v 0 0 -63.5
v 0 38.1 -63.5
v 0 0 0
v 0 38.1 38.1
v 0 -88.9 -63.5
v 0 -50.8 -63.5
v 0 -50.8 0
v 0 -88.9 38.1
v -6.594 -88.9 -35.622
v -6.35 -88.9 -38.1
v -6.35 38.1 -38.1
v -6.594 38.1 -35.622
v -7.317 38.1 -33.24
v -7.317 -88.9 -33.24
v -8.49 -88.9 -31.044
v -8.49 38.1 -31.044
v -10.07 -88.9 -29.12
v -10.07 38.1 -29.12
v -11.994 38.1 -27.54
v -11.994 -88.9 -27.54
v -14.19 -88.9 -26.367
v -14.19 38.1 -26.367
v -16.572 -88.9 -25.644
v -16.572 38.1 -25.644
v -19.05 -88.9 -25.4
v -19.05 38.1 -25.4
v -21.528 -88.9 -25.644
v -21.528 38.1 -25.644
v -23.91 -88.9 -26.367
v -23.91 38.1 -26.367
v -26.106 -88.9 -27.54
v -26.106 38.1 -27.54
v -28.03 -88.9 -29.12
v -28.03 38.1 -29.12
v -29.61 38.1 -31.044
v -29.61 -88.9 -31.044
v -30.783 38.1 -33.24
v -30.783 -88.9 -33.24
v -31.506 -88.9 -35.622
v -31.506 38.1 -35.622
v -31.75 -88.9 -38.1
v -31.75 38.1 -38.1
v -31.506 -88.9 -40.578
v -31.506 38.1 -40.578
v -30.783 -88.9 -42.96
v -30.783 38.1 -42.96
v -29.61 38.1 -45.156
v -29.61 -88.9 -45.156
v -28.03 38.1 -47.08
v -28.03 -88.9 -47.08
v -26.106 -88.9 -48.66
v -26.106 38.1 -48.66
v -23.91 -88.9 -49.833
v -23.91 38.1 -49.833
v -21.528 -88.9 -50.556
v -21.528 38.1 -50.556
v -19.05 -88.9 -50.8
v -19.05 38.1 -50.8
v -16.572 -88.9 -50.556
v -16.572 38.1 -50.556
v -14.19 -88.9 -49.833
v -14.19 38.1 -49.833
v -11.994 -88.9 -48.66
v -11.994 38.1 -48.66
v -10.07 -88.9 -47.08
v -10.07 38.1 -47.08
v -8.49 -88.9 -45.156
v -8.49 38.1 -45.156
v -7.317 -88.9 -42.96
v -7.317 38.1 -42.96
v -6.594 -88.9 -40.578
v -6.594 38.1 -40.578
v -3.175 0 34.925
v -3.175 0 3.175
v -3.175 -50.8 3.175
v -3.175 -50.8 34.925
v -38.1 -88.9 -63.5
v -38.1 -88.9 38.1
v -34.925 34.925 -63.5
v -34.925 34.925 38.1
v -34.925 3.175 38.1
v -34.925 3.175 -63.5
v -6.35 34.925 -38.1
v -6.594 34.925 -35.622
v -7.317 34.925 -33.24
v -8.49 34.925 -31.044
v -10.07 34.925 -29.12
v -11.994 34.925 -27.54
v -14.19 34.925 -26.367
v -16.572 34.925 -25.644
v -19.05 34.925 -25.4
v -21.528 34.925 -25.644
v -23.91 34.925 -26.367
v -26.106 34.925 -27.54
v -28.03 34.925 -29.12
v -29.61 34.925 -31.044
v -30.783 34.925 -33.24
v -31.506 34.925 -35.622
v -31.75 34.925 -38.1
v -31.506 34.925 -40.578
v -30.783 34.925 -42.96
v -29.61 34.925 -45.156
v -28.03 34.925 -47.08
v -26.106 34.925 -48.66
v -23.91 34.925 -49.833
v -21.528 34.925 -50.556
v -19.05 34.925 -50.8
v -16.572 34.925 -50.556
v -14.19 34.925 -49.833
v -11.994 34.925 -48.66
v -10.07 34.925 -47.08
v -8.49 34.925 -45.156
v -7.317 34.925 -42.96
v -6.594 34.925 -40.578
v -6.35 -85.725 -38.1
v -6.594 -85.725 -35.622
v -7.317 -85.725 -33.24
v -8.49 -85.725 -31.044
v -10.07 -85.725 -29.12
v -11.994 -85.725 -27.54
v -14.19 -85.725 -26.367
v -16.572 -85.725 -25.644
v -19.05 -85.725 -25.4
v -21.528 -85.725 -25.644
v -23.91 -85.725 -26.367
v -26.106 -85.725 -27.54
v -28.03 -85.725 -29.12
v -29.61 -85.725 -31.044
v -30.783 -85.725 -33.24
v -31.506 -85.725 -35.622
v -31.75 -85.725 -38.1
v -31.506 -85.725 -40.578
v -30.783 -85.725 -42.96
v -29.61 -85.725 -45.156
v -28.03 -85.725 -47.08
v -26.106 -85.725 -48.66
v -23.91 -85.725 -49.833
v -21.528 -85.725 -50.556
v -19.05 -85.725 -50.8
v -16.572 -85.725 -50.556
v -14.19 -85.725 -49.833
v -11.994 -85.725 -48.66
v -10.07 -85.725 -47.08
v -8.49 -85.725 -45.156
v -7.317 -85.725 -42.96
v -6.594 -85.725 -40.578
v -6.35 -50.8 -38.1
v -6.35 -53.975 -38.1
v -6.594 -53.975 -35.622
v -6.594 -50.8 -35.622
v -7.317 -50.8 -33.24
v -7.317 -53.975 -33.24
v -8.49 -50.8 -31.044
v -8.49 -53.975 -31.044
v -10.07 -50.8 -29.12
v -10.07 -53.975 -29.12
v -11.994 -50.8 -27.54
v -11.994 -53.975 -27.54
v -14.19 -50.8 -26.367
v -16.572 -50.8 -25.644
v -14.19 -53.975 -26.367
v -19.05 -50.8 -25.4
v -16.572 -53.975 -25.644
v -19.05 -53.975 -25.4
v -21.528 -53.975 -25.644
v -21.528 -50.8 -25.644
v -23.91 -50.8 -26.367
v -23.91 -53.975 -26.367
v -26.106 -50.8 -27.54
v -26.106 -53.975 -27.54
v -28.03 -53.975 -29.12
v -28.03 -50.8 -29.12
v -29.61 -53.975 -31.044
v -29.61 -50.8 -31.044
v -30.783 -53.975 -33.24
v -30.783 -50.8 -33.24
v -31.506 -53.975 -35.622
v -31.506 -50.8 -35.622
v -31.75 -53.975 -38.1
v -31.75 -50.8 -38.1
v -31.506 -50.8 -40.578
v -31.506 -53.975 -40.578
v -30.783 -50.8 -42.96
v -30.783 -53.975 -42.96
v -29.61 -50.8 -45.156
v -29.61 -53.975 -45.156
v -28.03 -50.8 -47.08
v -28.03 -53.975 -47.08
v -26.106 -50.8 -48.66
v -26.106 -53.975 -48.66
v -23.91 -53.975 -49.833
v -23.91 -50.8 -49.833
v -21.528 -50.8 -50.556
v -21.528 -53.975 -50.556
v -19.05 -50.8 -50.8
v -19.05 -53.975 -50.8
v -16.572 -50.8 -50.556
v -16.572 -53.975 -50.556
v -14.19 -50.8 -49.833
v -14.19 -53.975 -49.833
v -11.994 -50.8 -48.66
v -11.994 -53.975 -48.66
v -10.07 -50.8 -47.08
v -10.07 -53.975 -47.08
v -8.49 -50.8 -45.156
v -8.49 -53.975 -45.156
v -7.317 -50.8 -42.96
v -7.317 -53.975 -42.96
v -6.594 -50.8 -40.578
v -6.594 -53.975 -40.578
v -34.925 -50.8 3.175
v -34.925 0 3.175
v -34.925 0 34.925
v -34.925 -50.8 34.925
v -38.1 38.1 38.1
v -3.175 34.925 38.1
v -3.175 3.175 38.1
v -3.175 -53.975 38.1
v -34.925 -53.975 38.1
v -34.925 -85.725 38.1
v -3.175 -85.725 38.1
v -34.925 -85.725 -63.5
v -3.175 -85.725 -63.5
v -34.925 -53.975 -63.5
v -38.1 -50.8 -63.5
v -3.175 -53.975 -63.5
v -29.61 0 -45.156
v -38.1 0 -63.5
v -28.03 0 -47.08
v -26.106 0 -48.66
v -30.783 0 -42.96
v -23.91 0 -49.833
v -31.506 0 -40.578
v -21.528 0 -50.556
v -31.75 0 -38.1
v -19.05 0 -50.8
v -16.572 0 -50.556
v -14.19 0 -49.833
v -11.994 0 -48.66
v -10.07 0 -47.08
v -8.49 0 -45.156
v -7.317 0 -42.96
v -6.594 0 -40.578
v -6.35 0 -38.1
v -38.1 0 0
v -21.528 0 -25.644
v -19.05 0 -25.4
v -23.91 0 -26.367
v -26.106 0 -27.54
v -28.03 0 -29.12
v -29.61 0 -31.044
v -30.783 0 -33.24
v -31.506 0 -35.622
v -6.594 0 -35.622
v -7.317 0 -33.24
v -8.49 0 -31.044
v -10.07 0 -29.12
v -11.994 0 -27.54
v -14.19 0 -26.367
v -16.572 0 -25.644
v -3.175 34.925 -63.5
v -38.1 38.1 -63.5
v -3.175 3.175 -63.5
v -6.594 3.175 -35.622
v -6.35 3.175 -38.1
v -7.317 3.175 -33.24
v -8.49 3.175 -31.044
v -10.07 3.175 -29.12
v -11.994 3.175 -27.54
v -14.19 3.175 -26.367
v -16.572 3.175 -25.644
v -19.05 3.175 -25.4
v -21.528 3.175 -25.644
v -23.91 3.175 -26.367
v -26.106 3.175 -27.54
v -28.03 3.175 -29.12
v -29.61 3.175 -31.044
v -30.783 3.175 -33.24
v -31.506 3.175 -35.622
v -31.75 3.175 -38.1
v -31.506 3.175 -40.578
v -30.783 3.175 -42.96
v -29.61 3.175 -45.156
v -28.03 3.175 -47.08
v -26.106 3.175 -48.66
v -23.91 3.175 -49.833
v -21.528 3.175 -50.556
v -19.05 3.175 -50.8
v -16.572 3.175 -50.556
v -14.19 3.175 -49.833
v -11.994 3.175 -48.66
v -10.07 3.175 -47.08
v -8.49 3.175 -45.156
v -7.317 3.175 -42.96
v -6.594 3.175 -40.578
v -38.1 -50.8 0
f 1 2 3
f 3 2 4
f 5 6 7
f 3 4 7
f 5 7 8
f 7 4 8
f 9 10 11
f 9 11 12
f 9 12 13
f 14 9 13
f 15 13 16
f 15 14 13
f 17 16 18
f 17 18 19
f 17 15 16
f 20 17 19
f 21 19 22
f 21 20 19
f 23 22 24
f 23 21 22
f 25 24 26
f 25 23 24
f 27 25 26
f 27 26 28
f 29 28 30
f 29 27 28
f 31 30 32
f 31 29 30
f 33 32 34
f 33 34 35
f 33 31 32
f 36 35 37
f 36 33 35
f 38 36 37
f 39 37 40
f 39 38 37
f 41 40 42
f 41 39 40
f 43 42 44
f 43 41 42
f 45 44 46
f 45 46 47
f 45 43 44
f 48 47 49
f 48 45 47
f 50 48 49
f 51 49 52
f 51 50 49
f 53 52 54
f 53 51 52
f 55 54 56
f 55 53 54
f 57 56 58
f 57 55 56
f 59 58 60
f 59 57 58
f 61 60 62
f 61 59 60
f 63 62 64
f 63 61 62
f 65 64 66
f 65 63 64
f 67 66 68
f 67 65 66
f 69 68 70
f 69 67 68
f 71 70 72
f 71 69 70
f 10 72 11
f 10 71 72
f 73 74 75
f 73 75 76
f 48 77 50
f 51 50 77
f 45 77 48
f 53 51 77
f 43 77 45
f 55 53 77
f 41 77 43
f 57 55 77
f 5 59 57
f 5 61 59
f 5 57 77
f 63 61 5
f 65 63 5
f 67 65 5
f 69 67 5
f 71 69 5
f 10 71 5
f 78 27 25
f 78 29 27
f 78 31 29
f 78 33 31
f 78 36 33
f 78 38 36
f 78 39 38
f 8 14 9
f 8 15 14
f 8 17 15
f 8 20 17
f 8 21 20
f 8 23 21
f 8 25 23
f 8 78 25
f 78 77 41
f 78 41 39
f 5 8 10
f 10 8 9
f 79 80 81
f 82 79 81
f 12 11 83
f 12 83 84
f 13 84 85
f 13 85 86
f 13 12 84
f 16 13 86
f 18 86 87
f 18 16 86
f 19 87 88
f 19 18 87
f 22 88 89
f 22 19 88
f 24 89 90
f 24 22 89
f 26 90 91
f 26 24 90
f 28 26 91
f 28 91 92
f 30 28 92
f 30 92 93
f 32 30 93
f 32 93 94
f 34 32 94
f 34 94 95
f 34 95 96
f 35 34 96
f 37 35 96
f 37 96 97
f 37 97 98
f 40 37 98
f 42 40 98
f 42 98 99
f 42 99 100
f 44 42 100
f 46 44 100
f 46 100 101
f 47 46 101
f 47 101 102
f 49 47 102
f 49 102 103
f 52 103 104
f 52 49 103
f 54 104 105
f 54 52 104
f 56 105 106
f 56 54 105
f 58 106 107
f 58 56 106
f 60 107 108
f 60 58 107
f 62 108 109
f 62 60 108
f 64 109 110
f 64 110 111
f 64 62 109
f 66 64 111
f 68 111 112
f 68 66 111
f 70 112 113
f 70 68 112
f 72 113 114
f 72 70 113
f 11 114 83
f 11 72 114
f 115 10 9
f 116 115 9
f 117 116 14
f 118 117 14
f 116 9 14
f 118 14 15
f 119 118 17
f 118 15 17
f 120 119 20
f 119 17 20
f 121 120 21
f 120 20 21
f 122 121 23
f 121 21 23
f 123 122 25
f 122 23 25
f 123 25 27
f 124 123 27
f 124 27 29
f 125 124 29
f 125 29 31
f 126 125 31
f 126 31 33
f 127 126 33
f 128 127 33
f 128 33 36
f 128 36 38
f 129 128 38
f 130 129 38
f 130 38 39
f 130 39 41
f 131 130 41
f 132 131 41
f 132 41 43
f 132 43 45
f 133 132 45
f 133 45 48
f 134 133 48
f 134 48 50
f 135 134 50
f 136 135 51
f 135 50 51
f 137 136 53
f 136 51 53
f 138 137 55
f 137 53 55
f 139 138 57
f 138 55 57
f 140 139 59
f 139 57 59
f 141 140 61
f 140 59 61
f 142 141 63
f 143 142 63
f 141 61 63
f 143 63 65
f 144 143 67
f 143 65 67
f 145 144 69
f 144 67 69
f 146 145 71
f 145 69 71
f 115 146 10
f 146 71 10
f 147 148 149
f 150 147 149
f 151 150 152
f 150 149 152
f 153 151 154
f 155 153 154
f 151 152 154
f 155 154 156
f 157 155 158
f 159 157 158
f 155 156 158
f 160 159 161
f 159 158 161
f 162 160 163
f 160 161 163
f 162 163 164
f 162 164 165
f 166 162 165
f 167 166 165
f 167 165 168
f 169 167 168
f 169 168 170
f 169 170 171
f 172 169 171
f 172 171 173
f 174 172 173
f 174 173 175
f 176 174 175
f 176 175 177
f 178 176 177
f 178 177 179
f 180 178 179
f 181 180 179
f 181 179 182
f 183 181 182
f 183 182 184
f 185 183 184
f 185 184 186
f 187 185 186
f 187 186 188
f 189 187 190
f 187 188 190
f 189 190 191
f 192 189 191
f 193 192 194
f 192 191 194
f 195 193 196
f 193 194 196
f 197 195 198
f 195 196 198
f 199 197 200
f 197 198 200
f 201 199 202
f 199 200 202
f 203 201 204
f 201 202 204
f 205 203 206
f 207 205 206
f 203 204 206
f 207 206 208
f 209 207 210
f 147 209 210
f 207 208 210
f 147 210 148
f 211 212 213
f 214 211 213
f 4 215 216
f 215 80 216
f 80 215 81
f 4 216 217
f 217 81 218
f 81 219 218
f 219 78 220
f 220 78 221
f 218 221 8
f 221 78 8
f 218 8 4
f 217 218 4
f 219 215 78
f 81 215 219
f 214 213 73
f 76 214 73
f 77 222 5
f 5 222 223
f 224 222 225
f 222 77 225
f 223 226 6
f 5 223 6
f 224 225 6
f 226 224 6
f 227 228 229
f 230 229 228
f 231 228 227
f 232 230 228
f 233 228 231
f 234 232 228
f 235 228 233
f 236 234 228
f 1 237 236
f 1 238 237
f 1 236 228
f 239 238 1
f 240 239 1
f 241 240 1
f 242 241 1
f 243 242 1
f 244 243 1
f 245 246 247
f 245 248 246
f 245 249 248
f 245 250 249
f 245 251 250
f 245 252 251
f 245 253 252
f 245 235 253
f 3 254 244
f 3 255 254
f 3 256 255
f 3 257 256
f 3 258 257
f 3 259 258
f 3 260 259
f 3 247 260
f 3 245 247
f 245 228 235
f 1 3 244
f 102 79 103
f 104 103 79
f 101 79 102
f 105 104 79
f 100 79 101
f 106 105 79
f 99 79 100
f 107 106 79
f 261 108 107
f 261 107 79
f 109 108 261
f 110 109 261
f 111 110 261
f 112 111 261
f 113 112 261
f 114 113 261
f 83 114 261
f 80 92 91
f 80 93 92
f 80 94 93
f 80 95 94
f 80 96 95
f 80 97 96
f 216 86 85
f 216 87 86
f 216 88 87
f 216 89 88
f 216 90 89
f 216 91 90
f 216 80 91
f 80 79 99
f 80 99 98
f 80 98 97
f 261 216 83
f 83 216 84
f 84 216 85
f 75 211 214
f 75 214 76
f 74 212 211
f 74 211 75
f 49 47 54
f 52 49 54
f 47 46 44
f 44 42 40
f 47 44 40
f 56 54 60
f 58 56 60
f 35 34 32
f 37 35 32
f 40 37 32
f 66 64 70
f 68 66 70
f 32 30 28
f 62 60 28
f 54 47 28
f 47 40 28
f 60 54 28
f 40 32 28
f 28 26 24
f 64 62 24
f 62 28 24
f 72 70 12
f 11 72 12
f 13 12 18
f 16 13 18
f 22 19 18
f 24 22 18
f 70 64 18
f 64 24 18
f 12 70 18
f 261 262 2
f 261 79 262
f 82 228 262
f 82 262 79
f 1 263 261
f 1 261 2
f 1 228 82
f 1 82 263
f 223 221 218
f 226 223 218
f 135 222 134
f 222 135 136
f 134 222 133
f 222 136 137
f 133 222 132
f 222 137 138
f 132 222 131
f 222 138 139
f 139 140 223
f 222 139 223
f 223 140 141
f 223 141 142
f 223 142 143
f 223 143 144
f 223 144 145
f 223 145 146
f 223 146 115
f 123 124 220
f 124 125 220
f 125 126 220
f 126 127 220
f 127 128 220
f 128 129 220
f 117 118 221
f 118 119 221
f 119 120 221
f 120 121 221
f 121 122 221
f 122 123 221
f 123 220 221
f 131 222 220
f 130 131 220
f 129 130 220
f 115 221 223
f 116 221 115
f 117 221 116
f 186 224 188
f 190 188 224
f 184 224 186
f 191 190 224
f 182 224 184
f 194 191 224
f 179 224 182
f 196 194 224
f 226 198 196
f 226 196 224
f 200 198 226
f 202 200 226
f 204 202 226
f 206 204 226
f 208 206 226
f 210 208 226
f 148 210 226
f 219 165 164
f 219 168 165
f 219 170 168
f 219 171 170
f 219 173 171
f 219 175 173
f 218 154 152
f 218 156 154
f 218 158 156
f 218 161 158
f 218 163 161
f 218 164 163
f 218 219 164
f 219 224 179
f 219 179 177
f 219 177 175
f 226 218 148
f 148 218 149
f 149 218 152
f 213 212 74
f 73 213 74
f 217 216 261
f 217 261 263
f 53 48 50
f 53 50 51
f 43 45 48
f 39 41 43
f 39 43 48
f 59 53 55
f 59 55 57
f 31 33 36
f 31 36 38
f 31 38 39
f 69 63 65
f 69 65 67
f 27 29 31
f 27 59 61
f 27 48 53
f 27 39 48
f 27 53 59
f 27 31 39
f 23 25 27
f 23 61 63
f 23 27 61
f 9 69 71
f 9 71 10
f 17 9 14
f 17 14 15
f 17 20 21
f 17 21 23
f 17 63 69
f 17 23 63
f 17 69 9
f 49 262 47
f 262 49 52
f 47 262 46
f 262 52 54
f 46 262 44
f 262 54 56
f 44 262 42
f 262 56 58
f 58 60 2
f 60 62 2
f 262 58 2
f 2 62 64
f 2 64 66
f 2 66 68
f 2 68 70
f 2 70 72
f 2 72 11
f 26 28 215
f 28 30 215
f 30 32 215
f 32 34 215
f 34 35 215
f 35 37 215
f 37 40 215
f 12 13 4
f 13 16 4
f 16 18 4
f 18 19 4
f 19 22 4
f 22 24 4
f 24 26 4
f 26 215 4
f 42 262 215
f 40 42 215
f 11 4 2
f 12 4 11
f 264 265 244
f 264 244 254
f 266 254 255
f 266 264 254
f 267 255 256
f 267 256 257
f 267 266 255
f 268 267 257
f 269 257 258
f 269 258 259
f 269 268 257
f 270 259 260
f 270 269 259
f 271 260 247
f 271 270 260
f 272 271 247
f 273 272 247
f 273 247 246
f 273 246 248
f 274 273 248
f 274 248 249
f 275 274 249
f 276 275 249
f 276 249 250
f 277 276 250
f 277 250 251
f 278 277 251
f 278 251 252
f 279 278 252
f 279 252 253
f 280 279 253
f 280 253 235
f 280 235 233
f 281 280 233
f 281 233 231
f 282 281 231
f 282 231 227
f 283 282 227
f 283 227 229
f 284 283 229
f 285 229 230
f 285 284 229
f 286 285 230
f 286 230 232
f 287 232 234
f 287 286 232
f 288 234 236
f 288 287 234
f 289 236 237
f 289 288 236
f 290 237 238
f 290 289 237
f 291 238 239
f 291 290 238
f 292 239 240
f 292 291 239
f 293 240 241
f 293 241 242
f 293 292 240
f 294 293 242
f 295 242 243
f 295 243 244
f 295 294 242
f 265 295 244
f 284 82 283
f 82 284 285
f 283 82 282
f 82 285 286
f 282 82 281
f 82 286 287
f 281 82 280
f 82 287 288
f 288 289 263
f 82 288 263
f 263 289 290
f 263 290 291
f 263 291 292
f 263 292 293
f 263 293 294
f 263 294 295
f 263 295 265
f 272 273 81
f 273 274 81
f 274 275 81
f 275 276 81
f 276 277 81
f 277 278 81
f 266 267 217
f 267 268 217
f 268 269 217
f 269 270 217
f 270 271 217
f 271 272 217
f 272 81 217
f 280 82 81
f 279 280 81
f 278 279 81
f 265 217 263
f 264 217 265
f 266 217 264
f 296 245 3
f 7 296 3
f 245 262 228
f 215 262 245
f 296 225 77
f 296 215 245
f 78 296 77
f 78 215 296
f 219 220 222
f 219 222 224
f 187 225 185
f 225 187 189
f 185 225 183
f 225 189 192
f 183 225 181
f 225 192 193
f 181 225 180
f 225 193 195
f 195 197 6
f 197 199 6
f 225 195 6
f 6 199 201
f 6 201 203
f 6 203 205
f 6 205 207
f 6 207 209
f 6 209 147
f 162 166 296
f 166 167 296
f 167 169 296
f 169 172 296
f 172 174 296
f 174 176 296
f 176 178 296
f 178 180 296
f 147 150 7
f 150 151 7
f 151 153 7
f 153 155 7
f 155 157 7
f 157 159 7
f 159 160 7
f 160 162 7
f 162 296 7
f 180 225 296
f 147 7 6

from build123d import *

# Parameters (mm, degrees)
F0_W     = 38.0999970647
F0_H     = 38.1
F0_W_2   = 31.7499970647
F0_H_2   = 31.75
F1_DEPTH = 50.8
F2_W     = 38.0999970647
F2_H     = 38.1
F2_W_2   = 31.7499970647
F2_H_2   = 31.75
F3_DEPTH = 101.6
F5_R     = 12.7
F6_DEPTH = 88.901
F8_R     = 12.7
F9_DEPTH = 127


with BuildPart() as f1:
    # F0 (on Front) → F1 (new body)
    with BuildSketch(Plane.XZ):
        with Locations((-19.0499985323, 19.05)):
            Rectangle(F0_W, F0_H)
        with Locations((-19.0499985323, 19.05)):
            Rectangle(F0_W_2, F0_H_2, mode=Mode.SUBTRACT)
    extrude(amount=F1_DEPTH)



with BuildPart() as f3:
    # F2 (on face) → F3 (new body)
    with BuildSketch(Plane.XY.offset(38.1)):
        with Locations((-19.0499985323, -69.85)):
            Rectangle(F2_W, F2_H)
        with Locations((-19.0499985323, -69.85)):
            Rectangle(F2_W_2, F2_H_2, mode=Mode.SUBTRACT)
    extrude(amount=-F3_DEPTH)

    # F5 (on face) → F6 (cut, through all)
    with BuildSketch(Plane.XZ.offset(88.9)):
        with Locations((-19.0499985323, -38.1)):
            Circle(F5_R)
    extrude(amount=-F6_DEPTH, mode=Mode.SUBTRACT)


with BuildPart() as f1_1:
    add(f1.part)

    add(f3.part)  # F7 merges F3
    # F7: F3 across plane
    add(f3.part.mirror(Plane(origin=(-19.0499985323, -25.4, 19.05), x_dir=(1, 0, 0), z_dir=(0, 1, 0))))


with BuildPart() as f9:
    # F8 (on face) → F9 (new body)
    with BuildSketch(Plane.XZ.offset(88.9)):
        with Locations((-19.0499985323, -38.1)):
            Circle(F8_R)
    extrude(amount=-F9_DEPTH)


solid = Compound([f1_1.part, f9.part])
